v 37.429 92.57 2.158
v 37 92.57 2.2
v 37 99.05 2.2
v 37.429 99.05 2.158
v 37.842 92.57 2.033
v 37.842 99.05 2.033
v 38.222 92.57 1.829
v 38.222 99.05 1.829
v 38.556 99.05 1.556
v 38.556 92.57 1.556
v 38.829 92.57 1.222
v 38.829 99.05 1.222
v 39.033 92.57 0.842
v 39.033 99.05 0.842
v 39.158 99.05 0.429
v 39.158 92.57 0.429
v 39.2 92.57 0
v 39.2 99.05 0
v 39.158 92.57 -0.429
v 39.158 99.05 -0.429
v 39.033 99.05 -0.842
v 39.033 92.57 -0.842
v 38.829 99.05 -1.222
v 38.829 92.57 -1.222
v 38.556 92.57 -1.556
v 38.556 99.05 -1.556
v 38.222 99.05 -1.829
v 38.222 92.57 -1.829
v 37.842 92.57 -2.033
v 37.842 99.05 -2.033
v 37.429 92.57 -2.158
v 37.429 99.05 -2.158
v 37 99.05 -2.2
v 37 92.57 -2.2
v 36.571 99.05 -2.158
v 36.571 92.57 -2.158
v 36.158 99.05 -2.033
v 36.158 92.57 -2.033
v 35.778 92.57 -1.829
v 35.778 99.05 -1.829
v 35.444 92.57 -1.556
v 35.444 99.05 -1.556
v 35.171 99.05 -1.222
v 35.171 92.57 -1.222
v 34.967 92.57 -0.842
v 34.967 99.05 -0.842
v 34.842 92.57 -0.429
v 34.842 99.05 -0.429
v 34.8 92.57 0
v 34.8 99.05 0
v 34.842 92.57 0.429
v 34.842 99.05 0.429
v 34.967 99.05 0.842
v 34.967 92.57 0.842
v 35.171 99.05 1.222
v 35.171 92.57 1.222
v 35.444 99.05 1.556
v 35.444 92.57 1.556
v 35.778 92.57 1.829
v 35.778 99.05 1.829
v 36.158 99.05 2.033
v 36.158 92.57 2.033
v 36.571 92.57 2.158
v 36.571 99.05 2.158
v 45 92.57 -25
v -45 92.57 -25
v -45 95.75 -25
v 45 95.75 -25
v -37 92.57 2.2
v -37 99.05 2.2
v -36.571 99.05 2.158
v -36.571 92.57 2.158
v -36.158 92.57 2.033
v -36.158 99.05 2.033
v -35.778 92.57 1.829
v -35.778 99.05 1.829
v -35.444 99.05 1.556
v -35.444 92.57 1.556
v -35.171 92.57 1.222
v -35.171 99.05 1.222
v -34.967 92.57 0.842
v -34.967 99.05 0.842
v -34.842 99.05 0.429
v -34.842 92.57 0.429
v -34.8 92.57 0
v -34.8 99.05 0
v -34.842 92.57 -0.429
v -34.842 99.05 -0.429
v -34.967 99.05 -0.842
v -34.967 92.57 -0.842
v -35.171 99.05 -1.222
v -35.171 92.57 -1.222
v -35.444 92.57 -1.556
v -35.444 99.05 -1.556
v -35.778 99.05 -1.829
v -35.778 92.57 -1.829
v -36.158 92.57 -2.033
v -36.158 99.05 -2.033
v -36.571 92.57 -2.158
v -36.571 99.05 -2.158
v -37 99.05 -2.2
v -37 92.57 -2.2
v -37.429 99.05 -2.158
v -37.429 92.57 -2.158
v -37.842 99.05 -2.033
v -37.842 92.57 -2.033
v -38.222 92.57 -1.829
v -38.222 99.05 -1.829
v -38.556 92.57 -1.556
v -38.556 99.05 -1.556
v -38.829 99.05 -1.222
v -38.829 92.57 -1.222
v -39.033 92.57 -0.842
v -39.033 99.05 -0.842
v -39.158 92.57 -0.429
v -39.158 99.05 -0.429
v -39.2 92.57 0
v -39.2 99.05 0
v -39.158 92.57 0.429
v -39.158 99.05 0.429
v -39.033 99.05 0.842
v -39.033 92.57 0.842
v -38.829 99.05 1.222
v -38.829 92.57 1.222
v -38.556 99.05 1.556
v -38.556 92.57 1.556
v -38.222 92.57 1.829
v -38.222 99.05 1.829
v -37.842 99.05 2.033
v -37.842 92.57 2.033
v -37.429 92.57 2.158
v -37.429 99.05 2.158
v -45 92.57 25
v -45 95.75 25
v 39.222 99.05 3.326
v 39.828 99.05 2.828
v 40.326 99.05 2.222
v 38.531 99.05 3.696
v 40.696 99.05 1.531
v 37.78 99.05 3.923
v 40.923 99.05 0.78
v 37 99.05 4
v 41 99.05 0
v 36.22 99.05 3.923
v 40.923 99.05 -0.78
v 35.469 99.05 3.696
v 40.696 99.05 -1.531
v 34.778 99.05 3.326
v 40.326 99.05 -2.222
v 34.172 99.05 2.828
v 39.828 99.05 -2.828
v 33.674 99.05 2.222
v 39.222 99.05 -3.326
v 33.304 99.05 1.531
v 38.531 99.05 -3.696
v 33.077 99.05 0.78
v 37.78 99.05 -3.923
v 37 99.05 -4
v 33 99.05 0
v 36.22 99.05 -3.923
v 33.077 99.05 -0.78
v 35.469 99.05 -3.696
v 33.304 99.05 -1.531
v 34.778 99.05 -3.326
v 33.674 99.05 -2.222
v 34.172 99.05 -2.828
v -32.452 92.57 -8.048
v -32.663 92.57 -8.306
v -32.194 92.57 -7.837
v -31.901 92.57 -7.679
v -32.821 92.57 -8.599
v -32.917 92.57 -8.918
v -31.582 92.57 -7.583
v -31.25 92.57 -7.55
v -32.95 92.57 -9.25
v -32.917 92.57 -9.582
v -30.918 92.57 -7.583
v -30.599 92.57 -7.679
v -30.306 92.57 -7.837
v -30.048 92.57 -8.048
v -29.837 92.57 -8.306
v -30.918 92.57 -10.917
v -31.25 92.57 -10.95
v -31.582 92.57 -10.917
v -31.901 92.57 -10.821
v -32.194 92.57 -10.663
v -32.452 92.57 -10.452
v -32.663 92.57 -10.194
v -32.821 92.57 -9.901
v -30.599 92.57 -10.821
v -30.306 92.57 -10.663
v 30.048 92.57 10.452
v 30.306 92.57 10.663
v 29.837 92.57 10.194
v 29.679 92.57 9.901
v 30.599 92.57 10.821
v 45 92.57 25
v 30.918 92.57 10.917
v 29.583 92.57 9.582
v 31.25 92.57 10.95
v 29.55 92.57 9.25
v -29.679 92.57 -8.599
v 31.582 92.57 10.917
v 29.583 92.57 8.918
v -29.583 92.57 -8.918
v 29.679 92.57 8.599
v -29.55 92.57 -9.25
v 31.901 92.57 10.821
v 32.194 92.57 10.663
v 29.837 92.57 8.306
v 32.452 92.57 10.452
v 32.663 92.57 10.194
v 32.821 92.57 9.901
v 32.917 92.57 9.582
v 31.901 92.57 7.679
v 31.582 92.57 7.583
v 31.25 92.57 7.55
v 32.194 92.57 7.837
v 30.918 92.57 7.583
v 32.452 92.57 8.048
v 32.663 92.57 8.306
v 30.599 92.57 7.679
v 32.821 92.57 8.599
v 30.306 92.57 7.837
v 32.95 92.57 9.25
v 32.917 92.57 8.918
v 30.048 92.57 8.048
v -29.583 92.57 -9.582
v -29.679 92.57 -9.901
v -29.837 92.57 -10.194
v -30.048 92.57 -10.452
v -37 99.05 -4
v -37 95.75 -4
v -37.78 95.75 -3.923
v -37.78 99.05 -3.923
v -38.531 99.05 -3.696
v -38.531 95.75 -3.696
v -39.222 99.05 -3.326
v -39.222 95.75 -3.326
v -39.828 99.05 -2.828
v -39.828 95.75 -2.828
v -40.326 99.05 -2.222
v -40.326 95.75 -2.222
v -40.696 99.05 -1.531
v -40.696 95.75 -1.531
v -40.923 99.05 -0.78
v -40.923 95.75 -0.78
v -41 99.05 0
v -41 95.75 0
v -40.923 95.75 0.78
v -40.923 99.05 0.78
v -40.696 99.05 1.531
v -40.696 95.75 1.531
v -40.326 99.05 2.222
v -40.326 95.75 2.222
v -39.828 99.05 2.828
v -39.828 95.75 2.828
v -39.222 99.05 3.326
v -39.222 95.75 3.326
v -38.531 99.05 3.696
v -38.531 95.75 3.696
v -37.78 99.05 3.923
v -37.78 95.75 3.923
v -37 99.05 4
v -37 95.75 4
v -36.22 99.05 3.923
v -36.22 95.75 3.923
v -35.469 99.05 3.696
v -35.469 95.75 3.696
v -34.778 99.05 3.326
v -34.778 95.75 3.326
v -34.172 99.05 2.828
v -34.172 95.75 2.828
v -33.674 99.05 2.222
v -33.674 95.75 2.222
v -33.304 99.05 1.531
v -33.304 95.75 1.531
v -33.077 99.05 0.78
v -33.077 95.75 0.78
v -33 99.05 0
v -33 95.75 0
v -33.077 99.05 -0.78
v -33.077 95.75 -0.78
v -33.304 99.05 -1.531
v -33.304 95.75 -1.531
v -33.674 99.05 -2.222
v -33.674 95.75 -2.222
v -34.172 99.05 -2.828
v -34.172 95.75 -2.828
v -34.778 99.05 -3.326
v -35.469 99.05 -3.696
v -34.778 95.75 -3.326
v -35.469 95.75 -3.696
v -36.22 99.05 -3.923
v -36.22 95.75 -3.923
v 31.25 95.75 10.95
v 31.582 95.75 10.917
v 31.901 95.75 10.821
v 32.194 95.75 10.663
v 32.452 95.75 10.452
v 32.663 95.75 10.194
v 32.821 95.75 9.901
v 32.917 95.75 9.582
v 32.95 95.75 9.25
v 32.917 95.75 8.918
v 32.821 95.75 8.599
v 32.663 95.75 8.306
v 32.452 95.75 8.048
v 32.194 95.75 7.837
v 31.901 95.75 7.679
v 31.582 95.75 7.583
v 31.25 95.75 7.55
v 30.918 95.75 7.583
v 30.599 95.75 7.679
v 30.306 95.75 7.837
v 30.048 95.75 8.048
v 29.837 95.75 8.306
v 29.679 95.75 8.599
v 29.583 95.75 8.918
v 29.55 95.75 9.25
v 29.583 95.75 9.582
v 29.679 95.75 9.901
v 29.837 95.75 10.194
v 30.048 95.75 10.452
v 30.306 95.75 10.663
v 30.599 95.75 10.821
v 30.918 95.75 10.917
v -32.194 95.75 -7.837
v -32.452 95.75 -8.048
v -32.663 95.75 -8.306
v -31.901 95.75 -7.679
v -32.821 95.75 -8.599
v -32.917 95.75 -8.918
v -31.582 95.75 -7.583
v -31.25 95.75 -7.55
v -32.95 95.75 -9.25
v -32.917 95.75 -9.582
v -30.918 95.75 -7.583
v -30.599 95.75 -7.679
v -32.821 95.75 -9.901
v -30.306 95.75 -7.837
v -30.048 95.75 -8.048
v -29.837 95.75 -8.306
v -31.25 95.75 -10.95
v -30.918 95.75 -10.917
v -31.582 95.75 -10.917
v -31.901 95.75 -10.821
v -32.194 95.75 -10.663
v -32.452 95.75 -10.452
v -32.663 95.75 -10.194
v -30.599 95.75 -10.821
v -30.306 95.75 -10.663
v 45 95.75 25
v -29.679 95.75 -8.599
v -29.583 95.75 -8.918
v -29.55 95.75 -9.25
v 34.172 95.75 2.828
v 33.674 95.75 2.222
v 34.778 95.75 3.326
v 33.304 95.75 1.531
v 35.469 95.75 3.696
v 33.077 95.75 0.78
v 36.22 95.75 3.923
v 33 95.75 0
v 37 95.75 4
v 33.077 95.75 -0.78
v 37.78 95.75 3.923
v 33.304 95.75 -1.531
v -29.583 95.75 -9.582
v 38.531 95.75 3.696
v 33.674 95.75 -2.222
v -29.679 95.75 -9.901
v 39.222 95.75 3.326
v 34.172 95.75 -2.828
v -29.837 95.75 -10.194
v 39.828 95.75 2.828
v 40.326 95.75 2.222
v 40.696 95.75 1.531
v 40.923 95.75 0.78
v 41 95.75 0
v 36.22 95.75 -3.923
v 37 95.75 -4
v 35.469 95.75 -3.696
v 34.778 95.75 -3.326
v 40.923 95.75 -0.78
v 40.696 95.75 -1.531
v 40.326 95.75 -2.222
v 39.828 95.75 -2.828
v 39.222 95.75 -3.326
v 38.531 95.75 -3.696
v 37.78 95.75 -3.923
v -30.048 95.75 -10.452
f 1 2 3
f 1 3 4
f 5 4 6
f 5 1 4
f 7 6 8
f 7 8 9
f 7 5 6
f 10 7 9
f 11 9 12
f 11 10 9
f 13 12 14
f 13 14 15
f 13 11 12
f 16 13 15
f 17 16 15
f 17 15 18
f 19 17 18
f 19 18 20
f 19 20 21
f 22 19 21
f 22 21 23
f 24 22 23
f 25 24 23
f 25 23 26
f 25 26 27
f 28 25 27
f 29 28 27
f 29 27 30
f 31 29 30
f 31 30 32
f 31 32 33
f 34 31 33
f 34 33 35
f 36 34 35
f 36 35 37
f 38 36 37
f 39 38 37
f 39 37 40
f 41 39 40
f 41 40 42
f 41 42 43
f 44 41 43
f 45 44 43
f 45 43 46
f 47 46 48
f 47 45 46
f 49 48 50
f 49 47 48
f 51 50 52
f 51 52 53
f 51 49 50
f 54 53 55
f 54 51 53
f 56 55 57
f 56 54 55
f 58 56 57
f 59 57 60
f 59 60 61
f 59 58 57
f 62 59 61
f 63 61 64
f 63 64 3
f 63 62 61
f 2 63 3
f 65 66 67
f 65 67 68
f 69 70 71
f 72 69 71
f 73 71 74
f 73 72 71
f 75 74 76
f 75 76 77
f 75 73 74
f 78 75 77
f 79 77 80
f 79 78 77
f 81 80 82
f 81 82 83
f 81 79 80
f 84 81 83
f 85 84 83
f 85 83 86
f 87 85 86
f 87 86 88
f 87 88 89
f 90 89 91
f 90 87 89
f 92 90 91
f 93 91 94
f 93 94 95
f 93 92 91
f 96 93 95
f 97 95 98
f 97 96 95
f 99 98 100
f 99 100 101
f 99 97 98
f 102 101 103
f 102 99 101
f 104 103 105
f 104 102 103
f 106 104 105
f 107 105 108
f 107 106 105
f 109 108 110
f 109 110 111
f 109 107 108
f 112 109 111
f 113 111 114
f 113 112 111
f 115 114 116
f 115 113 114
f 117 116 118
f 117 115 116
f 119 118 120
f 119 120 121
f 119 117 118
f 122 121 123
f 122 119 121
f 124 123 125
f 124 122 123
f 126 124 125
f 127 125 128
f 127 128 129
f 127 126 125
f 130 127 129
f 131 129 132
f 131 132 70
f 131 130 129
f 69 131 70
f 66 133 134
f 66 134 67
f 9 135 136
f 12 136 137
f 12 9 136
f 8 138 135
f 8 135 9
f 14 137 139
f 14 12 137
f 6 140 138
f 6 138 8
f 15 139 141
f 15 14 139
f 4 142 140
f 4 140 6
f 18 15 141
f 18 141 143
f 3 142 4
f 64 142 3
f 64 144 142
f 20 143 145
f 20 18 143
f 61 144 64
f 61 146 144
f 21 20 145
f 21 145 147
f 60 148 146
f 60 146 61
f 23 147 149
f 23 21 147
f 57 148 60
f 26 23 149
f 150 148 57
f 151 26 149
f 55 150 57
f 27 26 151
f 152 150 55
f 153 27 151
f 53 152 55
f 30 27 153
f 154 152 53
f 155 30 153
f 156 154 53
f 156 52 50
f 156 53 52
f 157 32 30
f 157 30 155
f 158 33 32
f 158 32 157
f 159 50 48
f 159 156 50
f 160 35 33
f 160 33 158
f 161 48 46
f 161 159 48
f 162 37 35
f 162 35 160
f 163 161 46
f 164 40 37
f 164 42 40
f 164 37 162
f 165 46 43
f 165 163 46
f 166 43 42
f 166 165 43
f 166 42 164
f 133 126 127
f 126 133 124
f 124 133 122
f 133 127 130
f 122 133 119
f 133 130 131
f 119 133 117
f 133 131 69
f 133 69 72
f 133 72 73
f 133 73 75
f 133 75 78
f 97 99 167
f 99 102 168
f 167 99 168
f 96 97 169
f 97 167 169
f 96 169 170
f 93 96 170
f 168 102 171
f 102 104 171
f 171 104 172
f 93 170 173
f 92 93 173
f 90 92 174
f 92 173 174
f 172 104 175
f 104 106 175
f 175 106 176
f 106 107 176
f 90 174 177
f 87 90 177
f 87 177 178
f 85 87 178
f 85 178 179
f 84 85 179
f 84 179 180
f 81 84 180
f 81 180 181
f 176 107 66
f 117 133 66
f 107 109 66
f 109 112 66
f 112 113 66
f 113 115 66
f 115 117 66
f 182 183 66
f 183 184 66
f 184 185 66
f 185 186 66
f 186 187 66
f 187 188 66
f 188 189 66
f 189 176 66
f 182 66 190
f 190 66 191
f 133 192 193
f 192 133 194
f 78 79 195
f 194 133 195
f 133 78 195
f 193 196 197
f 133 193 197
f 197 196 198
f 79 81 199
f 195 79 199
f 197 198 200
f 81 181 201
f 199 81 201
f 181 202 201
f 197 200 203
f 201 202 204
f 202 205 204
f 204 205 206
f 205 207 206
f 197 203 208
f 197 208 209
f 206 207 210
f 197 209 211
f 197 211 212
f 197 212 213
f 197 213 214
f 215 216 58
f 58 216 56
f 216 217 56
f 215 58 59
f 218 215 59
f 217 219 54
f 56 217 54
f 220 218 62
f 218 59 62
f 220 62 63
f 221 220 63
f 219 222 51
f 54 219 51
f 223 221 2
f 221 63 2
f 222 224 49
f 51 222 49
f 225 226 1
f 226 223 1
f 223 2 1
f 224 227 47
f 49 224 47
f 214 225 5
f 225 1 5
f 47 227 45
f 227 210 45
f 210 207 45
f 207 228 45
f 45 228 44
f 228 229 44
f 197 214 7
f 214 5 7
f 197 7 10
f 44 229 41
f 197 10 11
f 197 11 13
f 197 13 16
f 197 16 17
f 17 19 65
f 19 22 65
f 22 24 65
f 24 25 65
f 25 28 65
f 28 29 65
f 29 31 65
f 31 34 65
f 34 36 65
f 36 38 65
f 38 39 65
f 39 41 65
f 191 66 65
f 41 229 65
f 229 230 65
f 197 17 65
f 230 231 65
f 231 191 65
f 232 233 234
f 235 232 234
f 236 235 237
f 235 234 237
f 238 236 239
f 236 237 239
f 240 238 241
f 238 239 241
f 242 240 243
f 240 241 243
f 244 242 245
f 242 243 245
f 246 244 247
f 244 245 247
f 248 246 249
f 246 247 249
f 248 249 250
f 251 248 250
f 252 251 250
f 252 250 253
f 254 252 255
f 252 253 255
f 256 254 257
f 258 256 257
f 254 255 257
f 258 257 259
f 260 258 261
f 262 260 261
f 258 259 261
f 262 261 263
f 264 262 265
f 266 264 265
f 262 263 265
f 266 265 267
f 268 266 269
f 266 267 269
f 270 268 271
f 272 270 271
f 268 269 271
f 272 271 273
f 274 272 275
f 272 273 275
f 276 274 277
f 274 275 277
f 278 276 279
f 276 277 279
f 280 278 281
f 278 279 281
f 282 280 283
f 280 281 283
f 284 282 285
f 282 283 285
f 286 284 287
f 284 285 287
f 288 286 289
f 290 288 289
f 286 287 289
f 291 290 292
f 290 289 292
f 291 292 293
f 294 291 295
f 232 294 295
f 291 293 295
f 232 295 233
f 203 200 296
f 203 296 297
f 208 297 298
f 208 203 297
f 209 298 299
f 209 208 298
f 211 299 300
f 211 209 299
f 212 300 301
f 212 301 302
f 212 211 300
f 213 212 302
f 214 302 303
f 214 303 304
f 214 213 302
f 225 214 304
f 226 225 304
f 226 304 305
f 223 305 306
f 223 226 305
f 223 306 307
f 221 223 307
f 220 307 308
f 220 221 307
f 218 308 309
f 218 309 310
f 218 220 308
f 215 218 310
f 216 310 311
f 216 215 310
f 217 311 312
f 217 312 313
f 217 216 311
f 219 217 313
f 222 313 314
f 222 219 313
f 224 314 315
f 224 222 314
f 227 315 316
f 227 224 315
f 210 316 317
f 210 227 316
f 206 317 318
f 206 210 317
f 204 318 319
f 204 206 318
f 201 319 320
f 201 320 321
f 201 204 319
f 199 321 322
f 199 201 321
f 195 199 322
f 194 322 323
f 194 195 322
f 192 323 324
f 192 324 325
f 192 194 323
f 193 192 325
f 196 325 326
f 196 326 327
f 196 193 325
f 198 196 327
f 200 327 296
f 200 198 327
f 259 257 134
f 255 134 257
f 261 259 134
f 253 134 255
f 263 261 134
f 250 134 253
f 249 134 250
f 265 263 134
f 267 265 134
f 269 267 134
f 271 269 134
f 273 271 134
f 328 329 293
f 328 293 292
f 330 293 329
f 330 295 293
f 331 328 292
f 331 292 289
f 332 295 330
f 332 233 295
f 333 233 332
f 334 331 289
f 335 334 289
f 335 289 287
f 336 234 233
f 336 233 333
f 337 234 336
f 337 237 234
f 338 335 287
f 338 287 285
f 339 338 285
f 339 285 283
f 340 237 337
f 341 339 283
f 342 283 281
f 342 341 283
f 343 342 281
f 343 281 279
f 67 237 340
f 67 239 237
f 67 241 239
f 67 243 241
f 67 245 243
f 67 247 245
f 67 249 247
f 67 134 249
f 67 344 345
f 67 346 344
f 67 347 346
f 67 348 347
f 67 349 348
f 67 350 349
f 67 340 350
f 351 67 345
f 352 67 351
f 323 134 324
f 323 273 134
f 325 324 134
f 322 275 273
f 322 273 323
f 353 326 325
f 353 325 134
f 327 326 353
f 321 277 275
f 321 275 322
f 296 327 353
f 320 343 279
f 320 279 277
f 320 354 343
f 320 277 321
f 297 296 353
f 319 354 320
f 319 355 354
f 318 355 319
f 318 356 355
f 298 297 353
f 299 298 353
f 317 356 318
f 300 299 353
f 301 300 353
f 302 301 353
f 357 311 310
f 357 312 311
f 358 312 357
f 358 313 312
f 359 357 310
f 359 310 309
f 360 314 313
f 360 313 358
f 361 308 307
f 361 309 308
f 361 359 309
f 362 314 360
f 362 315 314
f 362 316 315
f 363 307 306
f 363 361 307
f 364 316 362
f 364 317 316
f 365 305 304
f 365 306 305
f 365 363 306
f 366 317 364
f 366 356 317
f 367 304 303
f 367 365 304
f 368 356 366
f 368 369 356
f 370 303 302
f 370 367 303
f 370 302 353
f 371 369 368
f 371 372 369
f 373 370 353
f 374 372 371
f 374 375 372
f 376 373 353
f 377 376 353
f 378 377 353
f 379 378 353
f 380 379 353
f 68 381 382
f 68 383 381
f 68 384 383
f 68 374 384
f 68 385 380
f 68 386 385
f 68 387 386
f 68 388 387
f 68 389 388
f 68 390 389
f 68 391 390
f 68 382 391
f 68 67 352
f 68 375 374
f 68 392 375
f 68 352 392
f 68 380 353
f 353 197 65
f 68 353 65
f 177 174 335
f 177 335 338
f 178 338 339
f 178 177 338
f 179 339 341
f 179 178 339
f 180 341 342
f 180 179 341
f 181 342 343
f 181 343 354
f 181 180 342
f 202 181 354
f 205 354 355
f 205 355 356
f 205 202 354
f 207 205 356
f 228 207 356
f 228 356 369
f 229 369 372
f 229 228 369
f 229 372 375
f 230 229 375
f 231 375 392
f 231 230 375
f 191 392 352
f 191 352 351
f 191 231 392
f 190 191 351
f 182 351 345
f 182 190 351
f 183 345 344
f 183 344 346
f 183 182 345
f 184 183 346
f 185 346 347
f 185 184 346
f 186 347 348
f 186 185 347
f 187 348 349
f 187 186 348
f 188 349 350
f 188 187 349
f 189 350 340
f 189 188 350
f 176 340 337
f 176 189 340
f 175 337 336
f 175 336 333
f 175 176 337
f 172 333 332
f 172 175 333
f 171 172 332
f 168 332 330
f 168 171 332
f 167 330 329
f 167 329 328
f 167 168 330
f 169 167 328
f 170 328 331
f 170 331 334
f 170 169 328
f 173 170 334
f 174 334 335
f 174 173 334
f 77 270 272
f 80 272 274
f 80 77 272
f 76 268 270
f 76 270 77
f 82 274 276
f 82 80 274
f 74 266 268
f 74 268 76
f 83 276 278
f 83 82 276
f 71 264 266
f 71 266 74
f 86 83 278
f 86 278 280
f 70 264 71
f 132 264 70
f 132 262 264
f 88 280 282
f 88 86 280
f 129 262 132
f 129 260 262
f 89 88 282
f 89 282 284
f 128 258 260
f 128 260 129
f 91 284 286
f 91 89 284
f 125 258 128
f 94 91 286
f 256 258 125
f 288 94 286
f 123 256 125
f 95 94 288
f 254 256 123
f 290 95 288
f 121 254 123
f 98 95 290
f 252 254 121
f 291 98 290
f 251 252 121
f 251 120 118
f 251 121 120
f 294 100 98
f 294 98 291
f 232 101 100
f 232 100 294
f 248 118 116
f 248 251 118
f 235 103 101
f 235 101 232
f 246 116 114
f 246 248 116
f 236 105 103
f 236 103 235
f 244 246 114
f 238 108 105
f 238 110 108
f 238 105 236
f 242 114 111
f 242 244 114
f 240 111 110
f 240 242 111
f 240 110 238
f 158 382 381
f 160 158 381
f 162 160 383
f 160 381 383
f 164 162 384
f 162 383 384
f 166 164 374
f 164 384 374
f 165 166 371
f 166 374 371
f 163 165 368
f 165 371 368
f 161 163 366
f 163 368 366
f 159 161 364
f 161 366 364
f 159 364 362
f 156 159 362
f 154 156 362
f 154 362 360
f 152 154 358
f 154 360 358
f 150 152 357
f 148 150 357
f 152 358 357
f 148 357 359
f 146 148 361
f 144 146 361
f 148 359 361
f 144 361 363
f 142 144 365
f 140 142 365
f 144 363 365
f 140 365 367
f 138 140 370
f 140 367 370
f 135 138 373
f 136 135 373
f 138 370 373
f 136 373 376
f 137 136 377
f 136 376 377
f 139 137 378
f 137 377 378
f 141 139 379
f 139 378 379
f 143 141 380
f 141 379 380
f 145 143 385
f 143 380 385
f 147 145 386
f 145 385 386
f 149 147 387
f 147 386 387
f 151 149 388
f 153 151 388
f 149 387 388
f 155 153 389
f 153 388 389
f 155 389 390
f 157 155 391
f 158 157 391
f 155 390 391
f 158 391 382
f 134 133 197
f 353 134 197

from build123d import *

# Parameters (mm, degrees)
PLATE_START      = 92.57
PLATE_SKETCH_W   = 90
PLATE_SKETCH_H   = 50
PLATE_SKETCH_R   = 2.2
PLATE_SKETCH_R_2 = 1.7
PLATE_DEPTH      = 3.18
PADS_START       = 95.75
PADS_SKETCH_R    = 4
PADS_SKETCH_R_2  = 2.2
PADS_DEPTH       = 3.3


with BuildPart() as part:
    # Plate Sketch → Plate (new body)
    with BuildSketch(Plane(origin=(0, 0, 0), x_dir=(1, 0, 0), z_dir=(0, 1, 0)).offset(PLATE_START)):
        Rectangle(PLATE_SKETCH_W, PLATE_SKETCH_H)
        with Locations((-37, 0)):
            Circle(PLATE_SKETCH_R, mode=Mode.SUBTRACT)
        with Locations((37, 0)):
            Circle(PLATE_SKETCH_R, mode=Mode.SUBTRACT)
        with Locations((-31.25, 9.25)):
            Circle(PLATE_SKETCH_R_2, mode=Mode.SUBTRACT)
        with Locations((31.25, -9.25)):
            Circle(PLATE_SKETCH_R_2, mode=Mode.SUBTRACT)
    extrude(amount=PLATE_DEPTH)

    # Pads Sketch → Pads (add)
    # profile 1 of 2: a face of its own
    with BuildSketch(Plane(origin=(0, 0, 0), x_dir=(1, 0, 0), z_dir=(0, 1, 0)).offset(PADS_START)):
        with Locations((-37, 0)):
            Circle(PADS_SKETCH_R)
        with Locations((-37, 0)):
            Circle(PADS_SKETCH_R_2, mode=Mode.SUBTRACT)
    # profile 2 of 2: a face of its own
    with BuildSketch(Plane(origin=(0, 0, 0), x_dir=(1, 0, 0), z_dir=(0, 1, 0)).offset(PADS_START)):
        with Locations((37, 0)):
            Circle(PADS_SKETCH_R)
        with Locations((37, 0)):
            Circle(PADS_SKETCH_R_2, mode=Mode.SUBTRACT)
    extrude(amount=PADS_DEPTH)


solid = part.part
